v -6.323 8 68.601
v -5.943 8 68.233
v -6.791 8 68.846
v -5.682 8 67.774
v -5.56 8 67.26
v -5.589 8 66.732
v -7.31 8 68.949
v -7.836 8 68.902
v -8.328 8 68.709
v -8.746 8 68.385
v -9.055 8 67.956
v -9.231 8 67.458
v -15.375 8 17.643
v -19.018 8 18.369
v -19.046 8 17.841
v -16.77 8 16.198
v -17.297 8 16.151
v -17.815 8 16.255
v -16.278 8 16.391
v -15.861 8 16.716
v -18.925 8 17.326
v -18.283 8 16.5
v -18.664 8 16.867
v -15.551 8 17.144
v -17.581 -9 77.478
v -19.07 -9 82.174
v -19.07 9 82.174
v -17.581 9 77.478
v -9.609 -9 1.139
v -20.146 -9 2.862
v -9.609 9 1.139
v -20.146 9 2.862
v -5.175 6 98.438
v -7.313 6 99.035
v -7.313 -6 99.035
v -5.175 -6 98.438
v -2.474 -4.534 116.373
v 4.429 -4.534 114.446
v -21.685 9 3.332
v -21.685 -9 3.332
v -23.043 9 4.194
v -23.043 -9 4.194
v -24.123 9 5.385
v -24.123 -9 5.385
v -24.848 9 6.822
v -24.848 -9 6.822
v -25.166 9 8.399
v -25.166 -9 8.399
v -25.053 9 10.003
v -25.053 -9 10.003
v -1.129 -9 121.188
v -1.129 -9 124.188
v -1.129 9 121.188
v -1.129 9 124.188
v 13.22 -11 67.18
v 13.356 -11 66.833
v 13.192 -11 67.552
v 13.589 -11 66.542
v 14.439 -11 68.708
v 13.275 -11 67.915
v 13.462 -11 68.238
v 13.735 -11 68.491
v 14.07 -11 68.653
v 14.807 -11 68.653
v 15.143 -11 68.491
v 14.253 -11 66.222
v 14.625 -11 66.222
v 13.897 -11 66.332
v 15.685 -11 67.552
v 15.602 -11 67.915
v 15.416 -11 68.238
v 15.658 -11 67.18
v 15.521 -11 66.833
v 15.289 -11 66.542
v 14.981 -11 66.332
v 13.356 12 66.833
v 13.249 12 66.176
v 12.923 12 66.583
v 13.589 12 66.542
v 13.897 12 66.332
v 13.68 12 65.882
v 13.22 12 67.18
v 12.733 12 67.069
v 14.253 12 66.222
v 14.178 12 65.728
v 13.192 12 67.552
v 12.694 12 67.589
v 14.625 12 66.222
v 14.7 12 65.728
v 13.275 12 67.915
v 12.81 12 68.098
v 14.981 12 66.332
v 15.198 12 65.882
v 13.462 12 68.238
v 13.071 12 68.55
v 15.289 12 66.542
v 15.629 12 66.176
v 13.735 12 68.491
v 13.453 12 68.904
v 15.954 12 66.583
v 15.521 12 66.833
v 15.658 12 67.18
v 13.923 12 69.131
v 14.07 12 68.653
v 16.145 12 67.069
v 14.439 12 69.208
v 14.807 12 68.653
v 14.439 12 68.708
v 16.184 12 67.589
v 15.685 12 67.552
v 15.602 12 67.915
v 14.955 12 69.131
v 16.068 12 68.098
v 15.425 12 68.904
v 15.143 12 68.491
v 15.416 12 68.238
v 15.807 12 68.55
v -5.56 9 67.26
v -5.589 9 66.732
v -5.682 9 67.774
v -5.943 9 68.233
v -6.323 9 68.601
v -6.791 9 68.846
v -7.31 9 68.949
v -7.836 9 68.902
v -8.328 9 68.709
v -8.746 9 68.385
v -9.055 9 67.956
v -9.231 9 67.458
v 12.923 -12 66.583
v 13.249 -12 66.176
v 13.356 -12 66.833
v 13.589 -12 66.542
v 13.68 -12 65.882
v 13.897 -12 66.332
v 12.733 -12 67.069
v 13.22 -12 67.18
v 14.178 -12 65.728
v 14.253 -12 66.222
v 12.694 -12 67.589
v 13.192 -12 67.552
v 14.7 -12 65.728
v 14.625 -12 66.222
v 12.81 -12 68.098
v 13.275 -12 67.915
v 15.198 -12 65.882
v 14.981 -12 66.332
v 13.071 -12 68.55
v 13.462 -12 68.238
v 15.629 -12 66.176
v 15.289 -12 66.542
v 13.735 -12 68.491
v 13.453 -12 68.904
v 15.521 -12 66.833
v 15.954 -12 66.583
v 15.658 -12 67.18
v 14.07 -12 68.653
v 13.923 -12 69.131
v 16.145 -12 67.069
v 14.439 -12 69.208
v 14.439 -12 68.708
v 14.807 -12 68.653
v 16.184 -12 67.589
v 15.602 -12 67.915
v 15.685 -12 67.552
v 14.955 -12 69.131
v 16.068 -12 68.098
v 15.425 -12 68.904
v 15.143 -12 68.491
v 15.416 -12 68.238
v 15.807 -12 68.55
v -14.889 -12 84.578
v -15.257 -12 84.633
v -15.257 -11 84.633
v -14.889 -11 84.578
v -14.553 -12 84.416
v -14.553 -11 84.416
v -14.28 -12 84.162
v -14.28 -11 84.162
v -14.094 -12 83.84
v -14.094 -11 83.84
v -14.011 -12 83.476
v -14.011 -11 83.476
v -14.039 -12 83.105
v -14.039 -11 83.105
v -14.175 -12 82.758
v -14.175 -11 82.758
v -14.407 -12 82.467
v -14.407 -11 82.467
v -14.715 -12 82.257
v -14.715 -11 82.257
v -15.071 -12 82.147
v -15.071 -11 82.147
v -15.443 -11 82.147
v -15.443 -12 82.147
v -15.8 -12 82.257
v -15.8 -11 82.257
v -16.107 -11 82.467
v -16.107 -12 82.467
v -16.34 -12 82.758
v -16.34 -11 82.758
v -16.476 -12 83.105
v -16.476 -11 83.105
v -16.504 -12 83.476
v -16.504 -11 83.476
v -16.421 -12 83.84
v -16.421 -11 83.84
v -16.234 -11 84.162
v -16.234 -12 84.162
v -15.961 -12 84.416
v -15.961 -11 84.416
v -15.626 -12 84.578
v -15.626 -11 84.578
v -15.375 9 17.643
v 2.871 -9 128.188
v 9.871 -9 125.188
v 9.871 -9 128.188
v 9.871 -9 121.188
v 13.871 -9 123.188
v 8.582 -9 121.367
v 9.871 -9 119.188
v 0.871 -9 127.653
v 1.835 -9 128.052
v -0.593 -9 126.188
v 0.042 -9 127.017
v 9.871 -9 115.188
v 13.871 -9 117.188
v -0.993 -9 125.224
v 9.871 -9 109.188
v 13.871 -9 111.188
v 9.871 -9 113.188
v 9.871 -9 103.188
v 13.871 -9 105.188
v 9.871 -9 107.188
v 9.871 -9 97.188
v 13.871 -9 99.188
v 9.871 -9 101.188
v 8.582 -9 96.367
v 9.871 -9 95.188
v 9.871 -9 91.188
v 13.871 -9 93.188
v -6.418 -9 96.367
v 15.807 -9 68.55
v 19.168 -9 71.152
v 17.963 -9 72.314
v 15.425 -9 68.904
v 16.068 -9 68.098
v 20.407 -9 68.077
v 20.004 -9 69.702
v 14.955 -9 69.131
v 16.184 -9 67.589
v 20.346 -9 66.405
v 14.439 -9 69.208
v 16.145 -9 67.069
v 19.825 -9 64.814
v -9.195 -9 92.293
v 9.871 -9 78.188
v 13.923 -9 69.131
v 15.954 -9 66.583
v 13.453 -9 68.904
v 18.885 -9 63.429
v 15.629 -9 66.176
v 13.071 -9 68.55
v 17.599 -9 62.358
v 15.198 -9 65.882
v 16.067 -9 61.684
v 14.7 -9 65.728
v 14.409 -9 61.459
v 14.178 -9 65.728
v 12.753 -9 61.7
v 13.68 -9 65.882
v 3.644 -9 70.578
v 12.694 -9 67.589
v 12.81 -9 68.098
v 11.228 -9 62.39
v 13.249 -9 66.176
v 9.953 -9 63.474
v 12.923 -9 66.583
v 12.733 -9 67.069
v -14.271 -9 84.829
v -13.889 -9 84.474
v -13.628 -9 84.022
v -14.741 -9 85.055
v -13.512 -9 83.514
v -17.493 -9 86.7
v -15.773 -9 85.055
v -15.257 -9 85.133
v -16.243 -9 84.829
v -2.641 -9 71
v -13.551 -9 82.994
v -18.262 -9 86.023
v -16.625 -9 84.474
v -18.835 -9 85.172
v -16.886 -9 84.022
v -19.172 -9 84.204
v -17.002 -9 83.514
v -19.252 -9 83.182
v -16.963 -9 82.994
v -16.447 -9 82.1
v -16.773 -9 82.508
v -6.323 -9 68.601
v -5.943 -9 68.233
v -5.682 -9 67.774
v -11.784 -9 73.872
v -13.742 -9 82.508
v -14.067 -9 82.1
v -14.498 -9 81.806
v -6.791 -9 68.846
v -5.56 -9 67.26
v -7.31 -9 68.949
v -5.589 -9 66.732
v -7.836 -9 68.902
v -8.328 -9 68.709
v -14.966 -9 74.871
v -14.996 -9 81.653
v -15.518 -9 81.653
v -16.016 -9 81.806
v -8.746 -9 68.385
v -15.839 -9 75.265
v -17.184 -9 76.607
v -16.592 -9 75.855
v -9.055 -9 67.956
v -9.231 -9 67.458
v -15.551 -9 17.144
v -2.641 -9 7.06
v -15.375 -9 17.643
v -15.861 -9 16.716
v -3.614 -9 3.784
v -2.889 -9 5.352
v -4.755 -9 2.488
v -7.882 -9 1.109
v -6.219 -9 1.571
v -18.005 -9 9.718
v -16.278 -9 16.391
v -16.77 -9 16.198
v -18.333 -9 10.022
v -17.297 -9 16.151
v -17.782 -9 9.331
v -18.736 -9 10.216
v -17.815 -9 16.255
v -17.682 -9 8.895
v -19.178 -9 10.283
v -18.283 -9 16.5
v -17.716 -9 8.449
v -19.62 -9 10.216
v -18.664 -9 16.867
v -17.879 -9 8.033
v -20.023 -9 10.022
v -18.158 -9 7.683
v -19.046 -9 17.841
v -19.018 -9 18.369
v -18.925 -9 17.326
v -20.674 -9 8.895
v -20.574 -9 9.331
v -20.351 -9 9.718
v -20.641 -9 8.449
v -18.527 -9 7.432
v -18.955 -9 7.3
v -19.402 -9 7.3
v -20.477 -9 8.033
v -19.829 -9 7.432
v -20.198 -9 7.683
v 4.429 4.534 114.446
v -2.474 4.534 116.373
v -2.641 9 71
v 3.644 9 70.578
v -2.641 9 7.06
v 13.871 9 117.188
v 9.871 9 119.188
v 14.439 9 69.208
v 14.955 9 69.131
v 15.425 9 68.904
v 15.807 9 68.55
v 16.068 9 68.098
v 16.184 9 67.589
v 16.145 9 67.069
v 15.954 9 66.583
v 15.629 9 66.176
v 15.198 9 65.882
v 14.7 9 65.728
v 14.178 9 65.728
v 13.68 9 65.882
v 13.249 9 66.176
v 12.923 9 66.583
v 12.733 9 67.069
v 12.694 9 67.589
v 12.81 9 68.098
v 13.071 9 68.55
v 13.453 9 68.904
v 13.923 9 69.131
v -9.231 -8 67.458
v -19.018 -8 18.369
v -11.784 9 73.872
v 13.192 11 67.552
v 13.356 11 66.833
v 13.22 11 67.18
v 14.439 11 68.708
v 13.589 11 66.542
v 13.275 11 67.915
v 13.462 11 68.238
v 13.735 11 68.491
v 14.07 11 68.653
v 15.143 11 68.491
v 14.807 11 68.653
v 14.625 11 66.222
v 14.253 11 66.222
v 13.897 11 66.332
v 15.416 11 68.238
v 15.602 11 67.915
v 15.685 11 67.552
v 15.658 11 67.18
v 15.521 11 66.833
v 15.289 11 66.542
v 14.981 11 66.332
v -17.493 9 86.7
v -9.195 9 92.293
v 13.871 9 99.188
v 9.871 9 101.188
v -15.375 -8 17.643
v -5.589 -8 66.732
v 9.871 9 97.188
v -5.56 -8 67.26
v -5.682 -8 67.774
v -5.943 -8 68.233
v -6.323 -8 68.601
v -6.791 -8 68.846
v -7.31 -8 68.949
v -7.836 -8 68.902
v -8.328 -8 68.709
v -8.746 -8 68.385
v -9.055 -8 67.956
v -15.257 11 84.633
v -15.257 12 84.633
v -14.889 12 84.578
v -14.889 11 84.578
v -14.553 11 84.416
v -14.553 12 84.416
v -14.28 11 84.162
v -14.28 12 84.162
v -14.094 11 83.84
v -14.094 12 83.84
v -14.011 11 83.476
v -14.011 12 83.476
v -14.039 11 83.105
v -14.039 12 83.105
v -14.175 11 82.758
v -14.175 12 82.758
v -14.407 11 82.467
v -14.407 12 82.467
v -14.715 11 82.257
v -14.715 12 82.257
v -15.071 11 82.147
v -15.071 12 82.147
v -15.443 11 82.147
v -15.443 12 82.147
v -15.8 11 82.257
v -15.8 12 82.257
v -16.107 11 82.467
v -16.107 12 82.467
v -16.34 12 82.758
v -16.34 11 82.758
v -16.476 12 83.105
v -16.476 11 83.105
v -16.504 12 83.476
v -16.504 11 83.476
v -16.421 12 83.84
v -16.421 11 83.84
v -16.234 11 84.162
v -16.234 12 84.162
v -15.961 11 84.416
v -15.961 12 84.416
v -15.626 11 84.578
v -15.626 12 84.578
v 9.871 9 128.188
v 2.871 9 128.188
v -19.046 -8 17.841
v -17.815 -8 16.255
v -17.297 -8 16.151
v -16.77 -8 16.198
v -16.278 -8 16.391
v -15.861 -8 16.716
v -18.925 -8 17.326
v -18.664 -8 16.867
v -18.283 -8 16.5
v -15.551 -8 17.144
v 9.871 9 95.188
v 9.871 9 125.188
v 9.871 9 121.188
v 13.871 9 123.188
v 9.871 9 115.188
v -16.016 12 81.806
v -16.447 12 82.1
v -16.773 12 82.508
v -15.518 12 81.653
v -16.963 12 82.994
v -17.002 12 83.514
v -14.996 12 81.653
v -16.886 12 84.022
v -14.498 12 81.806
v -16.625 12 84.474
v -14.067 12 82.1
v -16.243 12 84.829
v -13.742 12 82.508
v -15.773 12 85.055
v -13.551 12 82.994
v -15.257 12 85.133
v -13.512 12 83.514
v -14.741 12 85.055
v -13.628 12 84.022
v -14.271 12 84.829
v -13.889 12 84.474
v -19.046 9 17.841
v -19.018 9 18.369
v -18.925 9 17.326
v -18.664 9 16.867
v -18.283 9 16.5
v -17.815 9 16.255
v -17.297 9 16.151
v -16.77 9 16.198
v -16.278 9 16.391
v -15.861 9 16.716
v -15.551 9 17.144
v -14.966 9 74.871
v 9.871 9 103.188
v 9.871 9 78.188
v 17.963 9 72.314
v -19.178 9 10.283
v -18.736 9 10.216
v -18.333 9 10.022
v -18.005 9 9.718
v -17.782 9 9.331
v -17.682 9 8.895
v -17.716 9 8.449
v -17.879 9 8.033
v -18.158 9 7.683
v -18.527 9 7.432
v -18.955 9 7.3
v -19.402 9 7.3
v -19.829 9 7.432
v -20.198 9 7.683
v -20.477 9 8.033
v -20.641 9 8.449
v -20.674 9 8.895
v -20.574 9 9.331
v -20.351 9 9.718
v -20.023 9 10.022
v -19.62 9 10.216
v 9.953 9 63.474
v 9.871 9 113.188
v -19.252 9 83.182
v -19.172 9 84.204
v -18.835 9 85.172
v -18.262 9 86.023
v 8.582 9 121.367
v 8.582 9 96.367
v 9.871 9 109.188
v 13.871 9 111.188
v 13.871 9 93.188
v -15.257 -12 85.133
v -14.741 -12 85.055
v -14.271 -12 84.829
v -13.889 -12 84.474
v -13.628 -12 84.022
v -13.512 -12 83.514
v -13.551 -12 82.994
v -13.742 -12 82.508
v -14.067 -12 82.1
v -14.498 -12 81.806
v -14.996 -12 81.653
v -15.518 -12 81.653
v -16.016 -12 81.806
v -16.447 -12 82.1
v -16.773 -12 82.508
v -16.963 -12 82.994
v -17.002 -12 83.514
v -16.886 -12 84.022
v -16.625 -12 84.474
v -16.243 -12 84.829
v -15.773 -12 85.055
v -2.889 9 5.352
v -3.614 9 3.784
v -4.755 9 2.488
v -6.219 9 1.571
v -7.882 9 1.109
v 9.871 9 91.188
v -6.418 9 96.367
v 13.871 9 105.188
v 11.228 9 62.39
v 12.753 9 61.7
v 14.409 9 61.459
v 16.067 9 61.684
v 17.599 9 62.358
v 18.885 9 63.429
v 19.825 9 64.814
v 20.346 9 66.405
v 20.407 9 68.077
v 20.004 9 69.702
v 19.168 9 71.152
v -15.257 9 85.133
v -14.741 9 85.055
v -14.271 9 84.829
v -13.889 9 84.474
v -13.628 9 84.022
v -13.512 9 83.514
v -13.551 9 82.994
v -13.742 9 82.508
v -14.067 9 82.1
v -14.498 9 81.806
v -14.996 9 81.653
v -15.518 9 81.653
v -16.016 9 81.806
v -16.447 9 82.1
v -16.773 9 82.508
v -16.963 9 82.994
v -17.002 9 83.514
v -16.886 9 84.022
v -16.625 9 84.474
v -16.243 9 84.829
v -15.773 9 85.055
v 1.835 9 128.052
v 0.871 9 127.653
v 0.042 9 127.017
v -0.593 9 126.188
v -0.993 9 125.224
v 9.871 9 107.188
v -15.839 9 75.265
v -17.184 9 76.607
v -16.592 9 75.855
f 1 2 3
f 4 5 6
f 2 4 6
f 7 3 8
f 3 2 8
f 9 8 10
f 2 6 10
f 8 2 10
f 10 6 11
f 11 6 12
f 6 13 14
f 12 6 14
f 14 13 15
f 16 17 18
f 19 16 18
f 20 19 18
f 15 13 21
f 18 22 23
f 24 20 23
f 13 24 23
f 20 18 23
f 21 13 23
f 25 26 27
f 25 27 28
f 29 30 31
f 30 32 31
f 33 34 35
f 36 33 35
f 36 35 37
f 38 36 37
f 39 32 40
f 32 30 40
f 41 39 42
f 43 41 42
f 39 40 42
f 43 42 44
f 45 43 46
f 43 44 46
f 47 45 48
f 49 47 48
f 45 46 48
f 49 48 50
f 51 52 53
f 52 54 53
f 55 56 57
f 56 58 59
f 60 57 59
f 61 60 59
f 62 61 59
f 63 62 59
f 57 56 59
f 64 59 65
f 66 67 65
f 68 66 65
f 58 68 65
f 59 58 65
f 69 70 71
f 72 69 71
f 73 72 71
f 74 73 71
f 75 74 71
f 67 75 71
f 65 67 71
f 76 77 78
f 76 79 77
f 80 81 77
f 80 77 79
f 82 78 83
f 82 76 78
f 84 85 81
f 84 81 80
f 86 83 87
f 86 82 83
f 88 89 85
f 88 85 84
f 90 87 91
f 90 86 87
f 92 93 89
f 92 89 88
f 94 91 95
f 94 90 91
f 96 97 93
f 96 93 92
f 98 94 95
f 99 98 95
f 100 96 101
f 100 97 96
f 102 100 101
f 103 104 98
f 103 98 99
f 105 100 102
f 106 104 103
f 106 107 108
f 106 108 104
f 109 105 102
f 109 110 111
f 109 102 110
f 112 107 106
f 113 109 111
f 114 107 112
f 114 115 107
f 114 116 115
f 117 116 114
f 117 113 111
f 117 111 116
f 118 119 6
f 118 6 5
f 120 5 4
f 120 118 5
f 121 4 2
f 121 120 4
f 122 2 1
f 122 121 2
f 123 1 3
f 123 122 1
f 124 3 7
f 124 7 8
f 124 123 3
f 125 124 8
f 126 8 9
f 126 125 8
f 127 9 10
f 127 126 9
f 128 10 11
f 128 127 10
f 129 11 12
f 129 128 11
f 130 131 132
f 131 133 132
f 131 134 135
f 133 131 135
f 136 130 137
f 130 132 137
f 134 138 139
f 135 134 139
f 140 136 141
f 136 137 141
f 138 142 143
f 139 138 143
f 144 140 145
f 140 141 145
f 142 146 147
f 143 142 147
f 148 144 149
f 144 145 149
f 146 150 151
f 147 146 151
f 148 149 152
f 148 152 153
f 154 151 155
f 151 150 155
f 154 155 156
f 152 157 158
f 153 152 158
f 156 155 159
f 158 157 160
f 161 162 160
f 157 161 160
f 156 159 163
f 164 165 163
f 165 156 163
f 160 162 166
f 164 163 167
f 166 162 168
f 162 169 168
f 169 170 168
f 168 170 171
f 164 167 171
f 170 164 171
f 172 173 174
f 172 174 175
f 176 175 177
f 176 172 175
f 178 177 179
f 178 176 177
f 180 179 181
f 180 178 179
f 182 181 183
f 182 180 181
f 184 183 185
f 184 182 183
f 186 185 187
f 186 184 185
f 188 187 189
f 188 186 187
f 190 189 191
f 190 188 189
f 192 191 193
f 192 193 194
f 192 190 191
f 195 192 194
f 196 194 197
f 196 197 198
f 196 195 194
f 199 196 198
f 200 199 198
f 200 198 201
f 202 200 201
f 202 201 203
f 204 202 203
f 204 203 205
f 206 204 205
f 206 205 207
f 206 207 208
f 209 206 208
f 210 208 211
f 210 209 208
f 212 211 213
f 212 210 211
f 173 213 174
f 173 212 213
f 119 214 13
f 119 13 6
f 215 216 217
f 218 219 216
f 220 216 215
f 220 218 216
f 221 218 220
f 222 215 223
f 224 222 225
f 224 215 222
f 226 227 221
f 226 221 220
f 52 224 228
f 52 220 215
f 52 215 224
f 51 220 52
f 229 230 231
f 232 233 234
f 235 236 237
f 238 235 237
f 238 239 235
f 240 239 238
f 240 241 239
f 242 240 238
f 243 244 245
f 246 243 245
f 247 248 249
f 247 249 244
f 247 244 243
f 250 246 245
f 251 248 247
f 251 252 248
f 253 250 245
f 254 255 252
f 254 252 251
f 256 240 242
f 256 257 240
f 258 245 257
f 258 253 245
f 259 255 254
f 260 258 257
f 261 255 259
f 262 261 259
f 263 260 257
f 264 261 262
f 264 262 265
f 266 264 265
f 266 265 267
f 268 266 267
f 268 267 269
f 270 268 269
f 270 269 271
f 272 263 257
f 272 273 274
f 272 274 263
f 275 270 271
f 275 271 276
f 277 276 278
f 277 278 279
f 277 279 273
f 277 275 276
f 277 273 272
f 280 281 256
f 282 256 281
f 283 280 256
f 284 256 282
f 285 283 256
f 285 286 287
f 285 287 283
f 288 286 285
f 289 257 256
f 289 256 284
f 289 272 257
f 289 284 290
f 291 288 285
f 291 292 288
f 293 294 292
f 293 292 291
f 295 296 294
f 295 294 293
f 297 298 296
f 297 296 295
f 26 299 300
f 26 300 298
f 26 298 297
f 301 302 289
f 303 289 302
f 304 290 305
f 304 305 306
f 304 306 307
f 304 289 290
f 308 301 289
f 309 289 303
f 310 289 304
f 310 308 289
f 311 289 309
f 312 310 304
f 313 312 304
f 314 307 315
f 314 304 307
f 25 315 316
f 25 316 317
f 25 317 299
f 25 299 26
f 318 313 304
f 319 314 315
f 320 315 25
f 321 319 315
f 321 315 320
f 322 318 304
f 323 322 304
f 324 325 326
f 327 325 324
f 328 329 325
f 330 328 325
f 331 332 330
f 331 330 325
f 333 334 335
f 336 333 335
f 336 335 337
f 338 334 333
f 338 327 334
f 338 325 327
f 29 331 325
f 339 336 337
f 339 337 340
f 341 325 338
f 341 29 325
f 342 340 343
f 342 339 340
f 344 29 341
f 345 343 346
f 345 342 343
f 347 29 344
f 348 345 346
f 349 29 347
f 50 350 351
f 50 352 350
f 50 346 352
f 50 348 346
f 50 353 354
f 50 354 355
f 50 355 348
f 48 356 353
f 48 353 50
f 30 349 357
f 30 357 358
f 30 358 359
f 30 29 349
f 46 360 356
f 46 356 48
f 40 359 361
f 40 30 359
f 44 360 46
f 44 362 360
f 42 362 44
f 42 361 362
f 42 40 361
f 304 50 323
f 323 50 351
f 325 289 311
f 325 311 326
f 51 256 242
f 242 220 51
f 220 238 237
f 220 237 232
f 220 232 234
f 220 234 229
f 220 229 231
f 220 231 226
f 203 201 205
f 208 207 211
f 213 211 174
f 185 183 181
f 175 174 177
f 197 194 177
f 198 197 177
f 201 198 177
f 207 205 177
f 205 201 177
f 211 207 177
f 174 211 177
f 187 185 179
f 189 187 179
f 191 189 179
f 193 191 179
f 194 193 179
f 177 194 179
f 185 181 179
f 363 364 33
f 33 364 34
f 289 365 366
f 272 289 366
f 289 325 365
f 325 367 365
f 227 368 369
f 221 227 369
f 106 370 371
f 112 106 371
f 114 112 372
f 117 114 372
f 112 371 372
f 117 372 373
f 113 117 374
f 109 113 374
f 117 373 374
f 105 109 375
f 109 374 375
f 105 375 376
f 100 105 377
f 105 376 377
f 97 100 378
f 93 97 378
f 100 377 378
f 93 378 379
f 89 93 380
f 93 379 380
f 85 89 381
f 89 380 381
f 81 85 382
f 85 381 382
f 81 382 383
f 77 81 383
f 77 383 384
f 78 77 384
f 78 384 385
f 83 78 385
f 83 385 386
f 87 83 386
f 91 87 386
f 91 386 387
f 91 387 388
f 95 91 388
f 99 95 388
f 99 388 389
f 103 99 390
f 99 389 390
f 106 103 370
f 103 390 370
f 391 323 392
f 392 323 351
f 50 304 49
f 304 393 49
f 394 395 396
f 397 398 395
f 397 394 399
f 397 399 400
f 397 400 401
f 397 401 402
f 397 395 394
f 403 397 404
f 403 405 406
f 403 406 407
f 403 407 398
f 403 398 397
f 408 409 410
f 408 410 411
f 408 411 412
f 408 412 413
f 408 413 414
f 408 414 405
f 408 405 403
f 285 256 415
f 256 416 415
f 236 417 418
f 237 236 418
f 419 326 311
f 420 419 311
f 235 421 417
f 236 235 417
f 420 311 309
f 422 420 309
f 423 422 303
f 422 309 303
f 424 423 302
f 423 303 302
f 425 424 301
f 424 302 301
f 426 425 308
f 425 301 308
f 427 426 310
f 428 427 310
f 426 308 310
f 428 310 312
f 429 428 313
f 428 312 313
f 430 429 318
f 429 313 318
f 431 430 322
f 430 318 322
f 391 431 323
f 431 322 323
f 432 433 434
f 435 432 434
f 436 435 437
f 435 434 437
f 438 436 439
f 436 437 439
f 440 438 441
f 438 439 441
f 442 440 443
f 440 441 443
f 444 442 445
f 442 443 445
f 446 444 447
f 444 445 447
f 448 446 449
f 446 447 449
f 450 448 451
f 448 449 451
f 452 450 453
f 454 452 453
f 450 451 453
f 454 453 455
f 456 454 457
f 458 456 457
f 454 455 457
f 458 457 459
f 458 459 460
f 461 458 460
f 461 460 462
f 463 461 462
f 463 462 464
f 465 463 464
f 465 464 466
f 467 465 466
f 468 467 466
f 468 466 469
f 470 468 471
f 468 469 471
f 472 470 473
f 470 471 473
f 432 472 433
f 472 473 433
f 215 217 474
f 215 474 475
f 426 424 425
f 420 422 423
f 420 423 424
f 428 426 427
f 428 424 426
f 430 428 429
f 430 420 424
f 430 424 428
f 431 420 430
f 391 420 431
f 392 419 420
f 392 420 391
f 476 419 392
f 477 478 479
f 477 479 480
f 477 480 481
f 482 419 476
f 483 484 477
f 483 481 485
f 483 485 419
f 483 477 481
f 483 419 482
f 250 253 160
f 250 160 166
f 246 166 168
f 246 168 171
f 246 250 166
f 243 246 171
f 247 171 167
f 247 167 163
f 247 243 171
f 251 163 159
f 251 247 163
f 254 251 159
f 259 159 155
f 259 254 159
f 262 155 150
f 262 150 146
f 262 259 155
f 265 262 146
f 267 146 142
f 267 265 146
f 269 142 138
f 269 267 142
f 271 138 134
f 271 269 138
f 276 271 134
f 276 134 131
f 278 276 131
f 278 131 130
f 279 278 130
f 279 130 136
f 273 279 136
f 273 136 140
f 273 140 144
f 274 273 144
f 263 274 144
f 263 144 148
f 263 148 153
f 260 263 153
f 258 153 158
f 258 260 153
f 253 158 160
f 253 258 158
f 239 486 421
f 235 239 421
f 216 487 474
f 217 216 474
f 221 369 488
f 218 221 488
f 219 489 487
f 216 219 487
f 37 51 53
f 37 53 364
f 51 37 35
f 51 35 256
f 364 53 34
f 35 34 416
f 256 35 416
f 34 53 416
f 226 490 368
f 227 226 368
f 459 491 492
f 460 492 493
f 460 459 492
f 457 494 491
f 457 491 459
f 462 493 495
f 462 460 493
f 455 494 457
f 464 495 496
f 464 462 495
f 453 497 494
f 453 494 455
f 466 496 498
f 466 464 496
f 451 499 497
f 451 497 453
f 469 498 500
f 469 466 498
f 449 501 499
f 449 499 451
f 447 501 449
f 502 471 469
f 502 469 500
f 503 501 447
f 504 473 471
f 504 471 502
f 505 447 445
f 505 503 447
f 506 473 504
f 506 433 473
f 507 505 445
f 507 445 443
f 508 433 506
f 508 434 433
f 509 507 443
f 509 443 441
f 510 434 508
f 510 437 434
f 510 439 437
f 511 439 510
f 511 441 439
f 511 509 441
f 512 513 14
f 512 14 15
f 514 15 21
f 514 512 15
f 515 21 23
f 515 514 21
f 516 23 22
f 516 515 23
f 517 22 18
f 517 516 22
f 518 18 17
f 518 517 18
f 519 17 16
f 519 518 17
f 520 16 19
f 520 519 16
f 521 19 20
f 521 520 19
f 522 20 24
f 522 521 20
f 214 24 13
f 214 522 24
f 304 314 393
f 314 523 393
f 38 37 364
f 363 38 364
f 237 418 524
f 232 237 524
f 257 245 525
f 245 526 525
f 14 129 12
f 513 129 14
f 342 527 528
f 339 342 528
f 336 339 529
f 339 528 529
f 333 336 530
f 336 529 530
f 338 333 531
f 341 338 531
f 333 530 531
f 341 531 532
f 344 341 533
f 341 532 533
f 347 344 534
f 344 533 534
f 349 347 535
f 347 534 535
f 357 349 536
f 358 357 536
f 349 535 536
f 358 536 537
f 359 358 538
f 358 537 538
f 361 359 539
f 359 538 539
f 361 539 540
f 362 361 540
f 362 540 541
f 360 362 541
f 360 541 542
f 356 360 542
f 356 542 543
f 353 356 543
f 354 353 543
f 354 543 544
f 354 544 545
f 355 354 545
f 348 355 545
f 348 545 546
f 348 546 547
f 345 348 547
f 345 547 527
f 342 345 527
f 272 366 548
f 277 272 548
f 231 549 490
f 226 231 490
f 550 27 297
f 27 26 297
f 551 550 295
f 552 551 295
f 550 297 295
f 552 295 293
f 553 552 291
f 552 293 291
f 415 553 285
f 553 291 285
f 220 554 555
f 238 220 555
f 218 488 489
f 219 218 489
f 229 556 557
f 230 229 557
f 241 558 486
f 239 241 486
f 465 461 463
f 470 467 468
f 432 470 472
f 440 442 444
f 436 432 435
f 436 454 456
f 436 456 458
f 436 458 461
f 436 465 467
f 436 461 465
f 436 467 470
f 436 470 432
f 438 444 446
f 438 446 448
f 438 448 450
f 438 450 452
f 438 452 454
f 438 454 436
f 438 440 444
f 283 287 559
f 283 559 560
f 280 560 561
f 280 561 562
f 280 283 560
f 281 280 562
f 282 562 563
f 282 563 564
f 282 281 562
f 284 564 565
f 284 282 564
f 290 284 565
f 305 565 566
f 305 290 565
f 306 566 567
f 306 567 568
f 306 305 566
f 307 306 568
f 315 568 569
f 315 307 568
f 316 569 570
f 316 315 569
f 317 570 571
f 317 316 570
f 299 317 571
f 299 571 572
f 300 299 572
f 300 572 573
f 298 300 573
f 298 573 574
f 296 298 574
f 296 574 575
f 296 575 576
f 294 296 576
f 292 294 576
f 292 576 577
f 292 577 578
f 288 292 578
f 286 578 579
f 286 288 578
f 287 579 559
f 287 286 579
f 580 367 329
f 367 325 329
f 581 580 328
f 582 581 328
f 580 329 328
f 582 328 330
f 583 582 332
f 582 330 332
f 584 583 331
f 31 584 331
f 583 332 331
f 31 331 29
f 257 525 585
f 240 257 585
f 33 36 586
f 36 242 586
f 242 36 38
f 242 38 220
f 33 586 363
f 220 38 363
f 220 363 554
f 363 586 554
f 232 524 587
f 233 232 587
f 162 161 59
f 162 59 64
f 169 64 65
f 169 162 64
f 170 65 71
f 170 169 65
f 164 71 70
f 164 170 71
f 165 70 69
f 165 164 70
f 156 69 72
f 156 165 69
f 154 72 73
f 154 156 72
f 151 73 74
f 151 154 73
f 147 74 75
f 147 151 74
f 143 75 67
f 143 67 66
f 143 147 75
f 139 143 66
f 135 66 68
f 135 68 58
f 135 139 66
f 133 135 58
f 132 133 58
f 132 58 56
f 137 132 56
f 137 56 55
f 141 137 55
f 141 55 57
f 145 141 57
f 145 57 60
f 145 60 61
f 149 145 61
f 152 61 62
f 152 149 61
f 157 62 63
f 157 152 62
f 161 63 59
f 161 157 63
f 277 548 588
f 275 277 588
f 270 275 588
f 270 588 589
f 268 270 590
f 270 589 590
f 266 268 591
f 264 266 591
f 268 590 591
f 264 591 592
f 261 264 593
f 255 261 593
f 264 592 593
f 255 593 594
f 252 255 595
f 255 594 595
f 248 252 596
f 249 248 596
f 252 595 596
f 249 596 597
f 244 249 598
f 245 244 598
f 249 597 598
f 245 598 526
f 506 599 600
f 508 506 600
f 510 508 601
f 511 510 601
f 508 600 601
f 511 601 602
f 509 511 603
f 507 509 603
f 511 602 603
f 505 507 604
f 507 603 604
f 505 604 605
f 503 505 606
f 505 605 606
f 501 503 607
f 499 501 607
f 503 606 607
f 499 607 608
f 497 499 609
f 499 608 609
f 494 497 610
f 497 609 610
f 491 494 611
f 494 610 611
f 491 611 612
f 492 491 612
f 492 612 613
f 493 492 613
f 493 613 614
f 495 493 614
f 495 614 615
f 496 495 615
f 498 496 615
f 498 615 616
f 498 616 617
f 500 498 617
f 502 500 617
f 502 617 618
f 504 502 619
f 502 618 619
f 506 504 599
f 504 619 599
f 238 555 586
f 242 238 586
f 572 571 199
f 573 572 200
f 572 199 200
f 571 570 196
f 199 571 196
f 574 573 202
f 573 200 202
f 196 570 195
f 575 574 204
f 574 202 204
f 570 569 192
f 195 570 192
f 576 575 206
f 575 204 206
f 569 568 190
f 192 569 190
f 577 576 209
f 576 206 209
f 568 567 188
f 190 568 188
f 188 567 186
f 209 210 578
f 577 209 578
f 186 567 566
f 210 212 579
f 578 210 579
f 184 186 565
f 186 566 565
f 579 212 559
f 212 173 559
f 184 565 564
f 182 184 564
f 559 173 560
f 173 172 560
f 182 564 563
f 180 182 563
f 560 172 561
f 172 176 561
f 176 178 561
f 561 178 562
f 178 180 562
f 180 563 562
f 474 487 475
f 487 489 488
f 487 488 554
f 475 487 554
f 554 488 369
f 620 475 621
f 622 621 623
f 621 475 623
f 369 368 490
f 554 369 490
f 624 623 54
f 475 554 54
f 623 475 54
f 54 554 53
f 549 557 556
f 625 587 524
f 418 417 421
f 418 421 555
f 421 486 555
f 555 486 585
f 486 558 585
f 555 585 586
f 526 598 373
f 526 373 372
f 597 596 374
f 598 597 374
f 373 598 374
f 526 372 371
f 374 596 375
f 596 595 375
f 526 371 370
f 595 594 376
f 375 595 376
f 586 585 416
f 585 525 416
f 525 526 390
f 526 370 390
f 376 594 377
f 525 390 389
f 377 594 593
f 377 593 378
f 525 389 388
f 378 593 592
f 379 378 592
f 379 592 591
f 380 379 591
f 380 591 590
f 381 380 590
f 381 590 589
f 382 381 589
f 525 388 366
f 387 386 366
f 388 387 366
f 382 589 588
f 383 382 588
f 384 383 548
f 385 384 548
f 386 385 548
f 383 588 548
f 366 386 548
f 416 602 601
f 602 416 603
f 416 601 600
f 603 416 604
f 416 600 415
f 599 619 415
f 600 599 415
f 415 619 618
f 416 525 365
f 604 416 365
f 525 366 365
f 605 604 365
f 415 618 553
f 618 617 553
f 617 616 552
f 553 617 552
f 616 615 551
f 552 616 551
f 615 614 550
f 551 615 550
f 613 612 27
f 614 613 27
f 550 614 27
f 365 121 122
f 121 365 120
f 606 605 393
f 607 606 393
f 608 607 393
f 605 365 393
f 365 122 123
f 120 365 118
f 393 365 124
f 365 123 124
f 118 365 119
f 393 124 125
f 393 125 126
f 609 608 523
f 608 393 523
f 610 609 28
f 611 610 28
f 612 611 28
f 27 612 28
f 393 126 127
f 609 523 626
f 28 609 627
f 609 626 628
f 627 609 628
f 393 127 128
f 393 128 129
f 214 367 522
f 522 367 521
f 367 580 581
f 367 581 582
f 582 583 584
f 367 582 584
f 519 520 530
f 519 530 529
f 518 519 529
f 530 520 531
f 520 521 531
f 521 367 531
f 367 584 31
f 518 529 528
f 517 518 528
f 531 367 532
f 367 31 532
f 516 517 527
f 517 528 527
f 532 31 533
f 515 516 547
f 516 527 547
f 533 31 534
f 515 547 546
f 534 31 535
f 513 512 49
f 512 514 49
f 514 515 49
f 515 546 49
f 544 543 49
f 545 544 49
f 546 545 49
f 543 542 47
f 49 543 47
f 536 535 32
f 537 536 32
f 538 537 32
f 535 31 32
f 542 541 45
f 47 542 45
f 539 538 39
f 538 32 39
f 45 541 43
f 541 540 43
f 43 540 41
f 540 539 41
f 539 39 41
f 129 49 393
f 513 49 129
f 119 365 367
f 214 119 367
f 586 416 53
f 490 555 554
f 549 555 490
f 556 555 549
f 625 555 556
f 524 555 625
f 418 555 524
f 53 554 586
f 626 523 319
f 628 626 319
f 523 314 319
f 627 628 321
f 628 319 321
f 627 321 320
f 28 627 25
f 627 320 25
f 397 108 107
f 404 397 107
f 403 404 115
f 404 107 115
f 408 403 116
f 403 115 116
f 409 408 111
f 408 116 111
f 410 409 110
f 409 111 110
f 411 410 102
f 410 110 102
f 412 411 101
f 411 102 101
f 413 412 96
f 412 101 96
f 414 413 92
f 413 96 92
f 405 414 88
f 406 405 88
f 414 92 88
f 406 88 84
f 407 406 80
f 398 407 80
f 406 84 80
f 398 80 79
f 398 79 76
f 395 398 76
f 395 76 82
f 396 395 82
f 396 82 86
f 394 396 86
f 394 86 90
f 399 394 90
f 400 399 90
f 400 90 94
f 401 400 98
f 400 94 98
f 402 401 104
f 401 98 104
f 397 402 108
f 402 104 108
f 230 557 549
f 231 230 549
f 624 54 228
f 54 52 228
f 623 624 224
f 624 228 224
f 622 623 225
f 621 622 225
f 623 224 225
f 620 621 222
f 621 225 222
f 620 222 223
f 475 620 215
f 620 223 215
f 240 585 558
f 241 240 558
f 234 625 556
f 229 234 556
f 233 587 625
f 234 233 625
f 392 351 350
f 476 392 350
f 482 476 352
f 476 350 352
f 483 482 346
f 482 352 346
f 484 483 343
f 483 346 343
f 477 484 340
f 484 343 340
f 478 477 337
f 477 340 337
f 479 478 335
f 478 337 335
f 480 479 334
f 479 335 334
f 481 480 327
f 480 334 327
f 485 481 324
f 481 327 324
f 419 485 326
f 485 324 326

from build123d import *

# Parameters (mm, degrees)
BOSS_EXTRUDE1_DEPTH = 9
FILLET1_R           = 6
FILLET2_R           = 4
BOSS_EXTRUDE2_DEPTH = 18
LPATTERN1_COUNT     = 6
LPATTERN1_PITCH     = 6
CUT_EXTRUDE1_DEPTH  = 26
CUT_EXTRUDE2_DEPTH  = 8
SKETCH7_R           = 1.5
CUT_EXTRUDE3_DEPTH  = 26
SKETCH8_R           = 1.75
BOSS_EXTRUDE3_DEPTH = 3
SKETCH9_R           = 1.25
CUT_EXTRUDE4_DEPTH  = 1
SKETCH10_R          = 1.25
CUT_EXTRUDE5_DEPTH  = 1
CUT_EXTRUDE6_DEPTH  = 1


with BuildPart() as part:
    # Sketch2 → Boss-Extrude1 (new, symmetric)
    with BuildSketch(Plane(origin=(0, 0, 0), x_dir=(1, 0, 0), z_dir=(0, 1, 0))):
        with BuildLine():
            ThreePointArc((9.952664911, -63.474262908), (18.884876985, -63.429469216), (17.963436499, -72.314139521))
            Line((17.963436499, -72.314139521), (9.870678178, -78.188427797))
            Line((9.870678178, -78.188427797), (9.870678178, -128.188427797))
            Line((9.870678178, -128.188427797), (-1.129321822, -128.188427797))
            Line((-1.129321822, -128.188427797), (-1.129321822, -121.188427797))
            Line((-1.129321822, -121.188427797), (-9.195214577, -92.293075678))
            Line((-9.195214577, -92.293075678), (-19.97492157, -85.026858152))
            Line((-19.97492157, -85.026858152), (-16.951577323, -75.494838976))
            Line((-16.951577323, -75.494838976), (-11.784410902, -73.871887989))
            Line((-11.784410902, -73.871887989), (-2.640867258, -71))
            Line((-2.640867258, -71), (3.643526088, -70.578297923))
            Line((3.643526088, -70.578297923), (9.952664911, -63.474262908))
        make_face()
        Polygon((-11.784410902, -73.871887989), (-26.326484906, -3.871887989), (-2.640867258, 0), (-2.640867258, -71), align=None)
    extrude(amount=BOSS_EXTRUDE1_DEPTH, both=True)

    # Fillet1
    fillet1_edges = [part.edges().sort_by_distance(p)[0] for p in [
        (-26.326484906, 0, 3.871887989),
        (-2.640867258, 0, 0),
    ]]
    fillet(fillet1_edges, radius=FILLET1_R)

    # Fillet2
    fillet2_edges = [part.edges().sort_by_distance(p)[0] for p in [
        (-1.129321822, 0, 128.188427797),
        (-19.97492157, 0, 85.026858152),
        (-16.951577323, 0, 75.494838976),
    ]]
    fillet(fillet2_edges, radius=FILLET2_R)

    # Sketch3 → Boss-Extrude2 (add)
    with BuildSketch(Plane(origin=(0, 9, 0), x_dir=(1, 0, 0), z_dir=(0, 1, 0))):
        Polygon((9.870678178, -125.188427797), (9.870678178, -121.188427797), (13.870678178, -123.188427797), align=None)
    boss_extrude2 = extrude(amount=-BOSS_EXTRUDE2_DEPTH)

    # LPattern1: Boss-Extrude2 ×6
    with Locations(*[(0, 0, -i * LPATTERN1_PITCH) for i in range(1, LPATTERN1_COUNT)]):
        add(boss_extrude2)

    # Sketch5 → Cut-Extrude1 (cut)
    with BuildSketch(Plane(origin=(0, 9, 0), x_dir=(1, 0, 0), z_dir=(0, 1, 0))):
        Polygon((8.581909731, -96.366546328), (-6.418090269, -96.366546328), (8.581909731, -121.366546328), align=None)
    extrude(amount=-CUT_EXTRUDE1_DEPTH, mode=Mode.SUBTRACT)

    # Sketch6 → Cut-Extrude2 (cut)
    with BuildSketch(Plane(origin=(-32.431019942, 0, 9.052844475), x_dir=(0.2688630918299989, 0, 0.9631784039582769), z_dir=(-0.963178403958277, 0, 0.2688630918299989))):
        Polygon((93.422443507, 6), (93.422443507, -6), (111.422443507, -4.533928271), (111.422443507, 4.533928271), align=None)
    extrude(amount=-CUT_EXTRUDE2_DEPTH, mode=Mode.SUBTRACT)

    # Sketch7 → Cut-Extrude3 (cut)
    with BuildSketch(Plane(origin=(0, 9, 0), x_dir=(1, 0, 0), z_dir=(0, 1, 0))):
        with Locations(Location((-19.178129346, -8.782985081, 0), (0, 0, 270))):
            Circle(SKETCH7_R)
    extrude(amount=-CUT_EXTRUDE3_DEPTH, mode=Mode.SUBTRACT)

    # Sketch8 → Boss-Extrude3 (add)
    with BuildSketch(Plane(origin=(0, 9, 0), x_dir=(1, 0, 0), z_dir=(0, 1, 0))):
        with Locations(Location((14.438863534, -67.458484528, 0), (0, 0, 270))):
            Circle(SKETCH8_R)
        with Locations(Location((-15.257160901, -83.38305422, 0), (0, 0, 270))):
            Circle(SKETCH8_R)
    boss_extrude3 = extrude(amount=BOSS_EXTRUDE3_DEPTH)

    # Sketch9 → Cut-Extrude4 (cut)
    with BuildSketch(Plane(origin=(0, 12, 0), x_dir=(1, 0, 0), z_dir=(0, 1, 0))):
        with Locations(Location((-15.257160901, -83.38305422, 0), (0, 0, 270))):
            Circle(SKETCH9_R)
    cut_extrude4 = extrude(amount=-CUT_EXTRUDE4_DEPTH, mode=Mode.SUBTRACT)

    # Sketch10 → Cut-Extrude5 (cut)
    with BuildSketch(Plane(origin=(0, 12, 0), x_dir=(1, 0, 0), z_dir=(0, 1, 0))):
        with Locations(Location((14.438863534, -67.458484528, 0), (0, 0, 270))):
            Circle(SKETCH10_R)
    cut_extrude5 = extrude(amount=-CUT_EXTRUDE5_DEPTH, mode=Mode.SUBTRACT)

    # Sketch11 → Cut-Extrude6 (cut)
    with BuildSketch(Plane(origin=(0, 9, 0), x_dir=(1, 0, 0), z_dir=(0, 1, 0))):
        with BuildLine():
            Line((-15.375345178, -17.642535787), (-5.588816332, -66.731764476))
            ThreePointArc((-5.588816332, -66.731764476), (-7.046968284, -68.91608772), (-9.231291528, -67.457935767))
            Line((-9.231291528, -67.457935767), (-19.017820373, -18.368707078))
            ThreePointArc((-19.017820373, -18.368707078), (-17.559668421, -16.184383835), (-15.375345178, -17.642535787))
        make_face()
    cut_extrude6 = extrude(amount=-CUT_EXTRUDE6_DEPTH, mode=Mode.SUBTRACT)

    # Mirror1: Boss-Extrude3, Cut-Extrude4, Cut-Extrude5, Cut-Extrude6 across plane
    add(boss_extrude3.mirror(Plane.ZX))
    add(cut_extrude4.mirror(Plane.ZX), mode=Mode.SUBTRACT)
    add(cut_extrude5.mirror(Plane.ZX), mode=Mode.SUBTRACT)
    add(cut_extrude6.mirror(Plane.ZX), mode=Mode.SUBTRACT)


solid = part.part
